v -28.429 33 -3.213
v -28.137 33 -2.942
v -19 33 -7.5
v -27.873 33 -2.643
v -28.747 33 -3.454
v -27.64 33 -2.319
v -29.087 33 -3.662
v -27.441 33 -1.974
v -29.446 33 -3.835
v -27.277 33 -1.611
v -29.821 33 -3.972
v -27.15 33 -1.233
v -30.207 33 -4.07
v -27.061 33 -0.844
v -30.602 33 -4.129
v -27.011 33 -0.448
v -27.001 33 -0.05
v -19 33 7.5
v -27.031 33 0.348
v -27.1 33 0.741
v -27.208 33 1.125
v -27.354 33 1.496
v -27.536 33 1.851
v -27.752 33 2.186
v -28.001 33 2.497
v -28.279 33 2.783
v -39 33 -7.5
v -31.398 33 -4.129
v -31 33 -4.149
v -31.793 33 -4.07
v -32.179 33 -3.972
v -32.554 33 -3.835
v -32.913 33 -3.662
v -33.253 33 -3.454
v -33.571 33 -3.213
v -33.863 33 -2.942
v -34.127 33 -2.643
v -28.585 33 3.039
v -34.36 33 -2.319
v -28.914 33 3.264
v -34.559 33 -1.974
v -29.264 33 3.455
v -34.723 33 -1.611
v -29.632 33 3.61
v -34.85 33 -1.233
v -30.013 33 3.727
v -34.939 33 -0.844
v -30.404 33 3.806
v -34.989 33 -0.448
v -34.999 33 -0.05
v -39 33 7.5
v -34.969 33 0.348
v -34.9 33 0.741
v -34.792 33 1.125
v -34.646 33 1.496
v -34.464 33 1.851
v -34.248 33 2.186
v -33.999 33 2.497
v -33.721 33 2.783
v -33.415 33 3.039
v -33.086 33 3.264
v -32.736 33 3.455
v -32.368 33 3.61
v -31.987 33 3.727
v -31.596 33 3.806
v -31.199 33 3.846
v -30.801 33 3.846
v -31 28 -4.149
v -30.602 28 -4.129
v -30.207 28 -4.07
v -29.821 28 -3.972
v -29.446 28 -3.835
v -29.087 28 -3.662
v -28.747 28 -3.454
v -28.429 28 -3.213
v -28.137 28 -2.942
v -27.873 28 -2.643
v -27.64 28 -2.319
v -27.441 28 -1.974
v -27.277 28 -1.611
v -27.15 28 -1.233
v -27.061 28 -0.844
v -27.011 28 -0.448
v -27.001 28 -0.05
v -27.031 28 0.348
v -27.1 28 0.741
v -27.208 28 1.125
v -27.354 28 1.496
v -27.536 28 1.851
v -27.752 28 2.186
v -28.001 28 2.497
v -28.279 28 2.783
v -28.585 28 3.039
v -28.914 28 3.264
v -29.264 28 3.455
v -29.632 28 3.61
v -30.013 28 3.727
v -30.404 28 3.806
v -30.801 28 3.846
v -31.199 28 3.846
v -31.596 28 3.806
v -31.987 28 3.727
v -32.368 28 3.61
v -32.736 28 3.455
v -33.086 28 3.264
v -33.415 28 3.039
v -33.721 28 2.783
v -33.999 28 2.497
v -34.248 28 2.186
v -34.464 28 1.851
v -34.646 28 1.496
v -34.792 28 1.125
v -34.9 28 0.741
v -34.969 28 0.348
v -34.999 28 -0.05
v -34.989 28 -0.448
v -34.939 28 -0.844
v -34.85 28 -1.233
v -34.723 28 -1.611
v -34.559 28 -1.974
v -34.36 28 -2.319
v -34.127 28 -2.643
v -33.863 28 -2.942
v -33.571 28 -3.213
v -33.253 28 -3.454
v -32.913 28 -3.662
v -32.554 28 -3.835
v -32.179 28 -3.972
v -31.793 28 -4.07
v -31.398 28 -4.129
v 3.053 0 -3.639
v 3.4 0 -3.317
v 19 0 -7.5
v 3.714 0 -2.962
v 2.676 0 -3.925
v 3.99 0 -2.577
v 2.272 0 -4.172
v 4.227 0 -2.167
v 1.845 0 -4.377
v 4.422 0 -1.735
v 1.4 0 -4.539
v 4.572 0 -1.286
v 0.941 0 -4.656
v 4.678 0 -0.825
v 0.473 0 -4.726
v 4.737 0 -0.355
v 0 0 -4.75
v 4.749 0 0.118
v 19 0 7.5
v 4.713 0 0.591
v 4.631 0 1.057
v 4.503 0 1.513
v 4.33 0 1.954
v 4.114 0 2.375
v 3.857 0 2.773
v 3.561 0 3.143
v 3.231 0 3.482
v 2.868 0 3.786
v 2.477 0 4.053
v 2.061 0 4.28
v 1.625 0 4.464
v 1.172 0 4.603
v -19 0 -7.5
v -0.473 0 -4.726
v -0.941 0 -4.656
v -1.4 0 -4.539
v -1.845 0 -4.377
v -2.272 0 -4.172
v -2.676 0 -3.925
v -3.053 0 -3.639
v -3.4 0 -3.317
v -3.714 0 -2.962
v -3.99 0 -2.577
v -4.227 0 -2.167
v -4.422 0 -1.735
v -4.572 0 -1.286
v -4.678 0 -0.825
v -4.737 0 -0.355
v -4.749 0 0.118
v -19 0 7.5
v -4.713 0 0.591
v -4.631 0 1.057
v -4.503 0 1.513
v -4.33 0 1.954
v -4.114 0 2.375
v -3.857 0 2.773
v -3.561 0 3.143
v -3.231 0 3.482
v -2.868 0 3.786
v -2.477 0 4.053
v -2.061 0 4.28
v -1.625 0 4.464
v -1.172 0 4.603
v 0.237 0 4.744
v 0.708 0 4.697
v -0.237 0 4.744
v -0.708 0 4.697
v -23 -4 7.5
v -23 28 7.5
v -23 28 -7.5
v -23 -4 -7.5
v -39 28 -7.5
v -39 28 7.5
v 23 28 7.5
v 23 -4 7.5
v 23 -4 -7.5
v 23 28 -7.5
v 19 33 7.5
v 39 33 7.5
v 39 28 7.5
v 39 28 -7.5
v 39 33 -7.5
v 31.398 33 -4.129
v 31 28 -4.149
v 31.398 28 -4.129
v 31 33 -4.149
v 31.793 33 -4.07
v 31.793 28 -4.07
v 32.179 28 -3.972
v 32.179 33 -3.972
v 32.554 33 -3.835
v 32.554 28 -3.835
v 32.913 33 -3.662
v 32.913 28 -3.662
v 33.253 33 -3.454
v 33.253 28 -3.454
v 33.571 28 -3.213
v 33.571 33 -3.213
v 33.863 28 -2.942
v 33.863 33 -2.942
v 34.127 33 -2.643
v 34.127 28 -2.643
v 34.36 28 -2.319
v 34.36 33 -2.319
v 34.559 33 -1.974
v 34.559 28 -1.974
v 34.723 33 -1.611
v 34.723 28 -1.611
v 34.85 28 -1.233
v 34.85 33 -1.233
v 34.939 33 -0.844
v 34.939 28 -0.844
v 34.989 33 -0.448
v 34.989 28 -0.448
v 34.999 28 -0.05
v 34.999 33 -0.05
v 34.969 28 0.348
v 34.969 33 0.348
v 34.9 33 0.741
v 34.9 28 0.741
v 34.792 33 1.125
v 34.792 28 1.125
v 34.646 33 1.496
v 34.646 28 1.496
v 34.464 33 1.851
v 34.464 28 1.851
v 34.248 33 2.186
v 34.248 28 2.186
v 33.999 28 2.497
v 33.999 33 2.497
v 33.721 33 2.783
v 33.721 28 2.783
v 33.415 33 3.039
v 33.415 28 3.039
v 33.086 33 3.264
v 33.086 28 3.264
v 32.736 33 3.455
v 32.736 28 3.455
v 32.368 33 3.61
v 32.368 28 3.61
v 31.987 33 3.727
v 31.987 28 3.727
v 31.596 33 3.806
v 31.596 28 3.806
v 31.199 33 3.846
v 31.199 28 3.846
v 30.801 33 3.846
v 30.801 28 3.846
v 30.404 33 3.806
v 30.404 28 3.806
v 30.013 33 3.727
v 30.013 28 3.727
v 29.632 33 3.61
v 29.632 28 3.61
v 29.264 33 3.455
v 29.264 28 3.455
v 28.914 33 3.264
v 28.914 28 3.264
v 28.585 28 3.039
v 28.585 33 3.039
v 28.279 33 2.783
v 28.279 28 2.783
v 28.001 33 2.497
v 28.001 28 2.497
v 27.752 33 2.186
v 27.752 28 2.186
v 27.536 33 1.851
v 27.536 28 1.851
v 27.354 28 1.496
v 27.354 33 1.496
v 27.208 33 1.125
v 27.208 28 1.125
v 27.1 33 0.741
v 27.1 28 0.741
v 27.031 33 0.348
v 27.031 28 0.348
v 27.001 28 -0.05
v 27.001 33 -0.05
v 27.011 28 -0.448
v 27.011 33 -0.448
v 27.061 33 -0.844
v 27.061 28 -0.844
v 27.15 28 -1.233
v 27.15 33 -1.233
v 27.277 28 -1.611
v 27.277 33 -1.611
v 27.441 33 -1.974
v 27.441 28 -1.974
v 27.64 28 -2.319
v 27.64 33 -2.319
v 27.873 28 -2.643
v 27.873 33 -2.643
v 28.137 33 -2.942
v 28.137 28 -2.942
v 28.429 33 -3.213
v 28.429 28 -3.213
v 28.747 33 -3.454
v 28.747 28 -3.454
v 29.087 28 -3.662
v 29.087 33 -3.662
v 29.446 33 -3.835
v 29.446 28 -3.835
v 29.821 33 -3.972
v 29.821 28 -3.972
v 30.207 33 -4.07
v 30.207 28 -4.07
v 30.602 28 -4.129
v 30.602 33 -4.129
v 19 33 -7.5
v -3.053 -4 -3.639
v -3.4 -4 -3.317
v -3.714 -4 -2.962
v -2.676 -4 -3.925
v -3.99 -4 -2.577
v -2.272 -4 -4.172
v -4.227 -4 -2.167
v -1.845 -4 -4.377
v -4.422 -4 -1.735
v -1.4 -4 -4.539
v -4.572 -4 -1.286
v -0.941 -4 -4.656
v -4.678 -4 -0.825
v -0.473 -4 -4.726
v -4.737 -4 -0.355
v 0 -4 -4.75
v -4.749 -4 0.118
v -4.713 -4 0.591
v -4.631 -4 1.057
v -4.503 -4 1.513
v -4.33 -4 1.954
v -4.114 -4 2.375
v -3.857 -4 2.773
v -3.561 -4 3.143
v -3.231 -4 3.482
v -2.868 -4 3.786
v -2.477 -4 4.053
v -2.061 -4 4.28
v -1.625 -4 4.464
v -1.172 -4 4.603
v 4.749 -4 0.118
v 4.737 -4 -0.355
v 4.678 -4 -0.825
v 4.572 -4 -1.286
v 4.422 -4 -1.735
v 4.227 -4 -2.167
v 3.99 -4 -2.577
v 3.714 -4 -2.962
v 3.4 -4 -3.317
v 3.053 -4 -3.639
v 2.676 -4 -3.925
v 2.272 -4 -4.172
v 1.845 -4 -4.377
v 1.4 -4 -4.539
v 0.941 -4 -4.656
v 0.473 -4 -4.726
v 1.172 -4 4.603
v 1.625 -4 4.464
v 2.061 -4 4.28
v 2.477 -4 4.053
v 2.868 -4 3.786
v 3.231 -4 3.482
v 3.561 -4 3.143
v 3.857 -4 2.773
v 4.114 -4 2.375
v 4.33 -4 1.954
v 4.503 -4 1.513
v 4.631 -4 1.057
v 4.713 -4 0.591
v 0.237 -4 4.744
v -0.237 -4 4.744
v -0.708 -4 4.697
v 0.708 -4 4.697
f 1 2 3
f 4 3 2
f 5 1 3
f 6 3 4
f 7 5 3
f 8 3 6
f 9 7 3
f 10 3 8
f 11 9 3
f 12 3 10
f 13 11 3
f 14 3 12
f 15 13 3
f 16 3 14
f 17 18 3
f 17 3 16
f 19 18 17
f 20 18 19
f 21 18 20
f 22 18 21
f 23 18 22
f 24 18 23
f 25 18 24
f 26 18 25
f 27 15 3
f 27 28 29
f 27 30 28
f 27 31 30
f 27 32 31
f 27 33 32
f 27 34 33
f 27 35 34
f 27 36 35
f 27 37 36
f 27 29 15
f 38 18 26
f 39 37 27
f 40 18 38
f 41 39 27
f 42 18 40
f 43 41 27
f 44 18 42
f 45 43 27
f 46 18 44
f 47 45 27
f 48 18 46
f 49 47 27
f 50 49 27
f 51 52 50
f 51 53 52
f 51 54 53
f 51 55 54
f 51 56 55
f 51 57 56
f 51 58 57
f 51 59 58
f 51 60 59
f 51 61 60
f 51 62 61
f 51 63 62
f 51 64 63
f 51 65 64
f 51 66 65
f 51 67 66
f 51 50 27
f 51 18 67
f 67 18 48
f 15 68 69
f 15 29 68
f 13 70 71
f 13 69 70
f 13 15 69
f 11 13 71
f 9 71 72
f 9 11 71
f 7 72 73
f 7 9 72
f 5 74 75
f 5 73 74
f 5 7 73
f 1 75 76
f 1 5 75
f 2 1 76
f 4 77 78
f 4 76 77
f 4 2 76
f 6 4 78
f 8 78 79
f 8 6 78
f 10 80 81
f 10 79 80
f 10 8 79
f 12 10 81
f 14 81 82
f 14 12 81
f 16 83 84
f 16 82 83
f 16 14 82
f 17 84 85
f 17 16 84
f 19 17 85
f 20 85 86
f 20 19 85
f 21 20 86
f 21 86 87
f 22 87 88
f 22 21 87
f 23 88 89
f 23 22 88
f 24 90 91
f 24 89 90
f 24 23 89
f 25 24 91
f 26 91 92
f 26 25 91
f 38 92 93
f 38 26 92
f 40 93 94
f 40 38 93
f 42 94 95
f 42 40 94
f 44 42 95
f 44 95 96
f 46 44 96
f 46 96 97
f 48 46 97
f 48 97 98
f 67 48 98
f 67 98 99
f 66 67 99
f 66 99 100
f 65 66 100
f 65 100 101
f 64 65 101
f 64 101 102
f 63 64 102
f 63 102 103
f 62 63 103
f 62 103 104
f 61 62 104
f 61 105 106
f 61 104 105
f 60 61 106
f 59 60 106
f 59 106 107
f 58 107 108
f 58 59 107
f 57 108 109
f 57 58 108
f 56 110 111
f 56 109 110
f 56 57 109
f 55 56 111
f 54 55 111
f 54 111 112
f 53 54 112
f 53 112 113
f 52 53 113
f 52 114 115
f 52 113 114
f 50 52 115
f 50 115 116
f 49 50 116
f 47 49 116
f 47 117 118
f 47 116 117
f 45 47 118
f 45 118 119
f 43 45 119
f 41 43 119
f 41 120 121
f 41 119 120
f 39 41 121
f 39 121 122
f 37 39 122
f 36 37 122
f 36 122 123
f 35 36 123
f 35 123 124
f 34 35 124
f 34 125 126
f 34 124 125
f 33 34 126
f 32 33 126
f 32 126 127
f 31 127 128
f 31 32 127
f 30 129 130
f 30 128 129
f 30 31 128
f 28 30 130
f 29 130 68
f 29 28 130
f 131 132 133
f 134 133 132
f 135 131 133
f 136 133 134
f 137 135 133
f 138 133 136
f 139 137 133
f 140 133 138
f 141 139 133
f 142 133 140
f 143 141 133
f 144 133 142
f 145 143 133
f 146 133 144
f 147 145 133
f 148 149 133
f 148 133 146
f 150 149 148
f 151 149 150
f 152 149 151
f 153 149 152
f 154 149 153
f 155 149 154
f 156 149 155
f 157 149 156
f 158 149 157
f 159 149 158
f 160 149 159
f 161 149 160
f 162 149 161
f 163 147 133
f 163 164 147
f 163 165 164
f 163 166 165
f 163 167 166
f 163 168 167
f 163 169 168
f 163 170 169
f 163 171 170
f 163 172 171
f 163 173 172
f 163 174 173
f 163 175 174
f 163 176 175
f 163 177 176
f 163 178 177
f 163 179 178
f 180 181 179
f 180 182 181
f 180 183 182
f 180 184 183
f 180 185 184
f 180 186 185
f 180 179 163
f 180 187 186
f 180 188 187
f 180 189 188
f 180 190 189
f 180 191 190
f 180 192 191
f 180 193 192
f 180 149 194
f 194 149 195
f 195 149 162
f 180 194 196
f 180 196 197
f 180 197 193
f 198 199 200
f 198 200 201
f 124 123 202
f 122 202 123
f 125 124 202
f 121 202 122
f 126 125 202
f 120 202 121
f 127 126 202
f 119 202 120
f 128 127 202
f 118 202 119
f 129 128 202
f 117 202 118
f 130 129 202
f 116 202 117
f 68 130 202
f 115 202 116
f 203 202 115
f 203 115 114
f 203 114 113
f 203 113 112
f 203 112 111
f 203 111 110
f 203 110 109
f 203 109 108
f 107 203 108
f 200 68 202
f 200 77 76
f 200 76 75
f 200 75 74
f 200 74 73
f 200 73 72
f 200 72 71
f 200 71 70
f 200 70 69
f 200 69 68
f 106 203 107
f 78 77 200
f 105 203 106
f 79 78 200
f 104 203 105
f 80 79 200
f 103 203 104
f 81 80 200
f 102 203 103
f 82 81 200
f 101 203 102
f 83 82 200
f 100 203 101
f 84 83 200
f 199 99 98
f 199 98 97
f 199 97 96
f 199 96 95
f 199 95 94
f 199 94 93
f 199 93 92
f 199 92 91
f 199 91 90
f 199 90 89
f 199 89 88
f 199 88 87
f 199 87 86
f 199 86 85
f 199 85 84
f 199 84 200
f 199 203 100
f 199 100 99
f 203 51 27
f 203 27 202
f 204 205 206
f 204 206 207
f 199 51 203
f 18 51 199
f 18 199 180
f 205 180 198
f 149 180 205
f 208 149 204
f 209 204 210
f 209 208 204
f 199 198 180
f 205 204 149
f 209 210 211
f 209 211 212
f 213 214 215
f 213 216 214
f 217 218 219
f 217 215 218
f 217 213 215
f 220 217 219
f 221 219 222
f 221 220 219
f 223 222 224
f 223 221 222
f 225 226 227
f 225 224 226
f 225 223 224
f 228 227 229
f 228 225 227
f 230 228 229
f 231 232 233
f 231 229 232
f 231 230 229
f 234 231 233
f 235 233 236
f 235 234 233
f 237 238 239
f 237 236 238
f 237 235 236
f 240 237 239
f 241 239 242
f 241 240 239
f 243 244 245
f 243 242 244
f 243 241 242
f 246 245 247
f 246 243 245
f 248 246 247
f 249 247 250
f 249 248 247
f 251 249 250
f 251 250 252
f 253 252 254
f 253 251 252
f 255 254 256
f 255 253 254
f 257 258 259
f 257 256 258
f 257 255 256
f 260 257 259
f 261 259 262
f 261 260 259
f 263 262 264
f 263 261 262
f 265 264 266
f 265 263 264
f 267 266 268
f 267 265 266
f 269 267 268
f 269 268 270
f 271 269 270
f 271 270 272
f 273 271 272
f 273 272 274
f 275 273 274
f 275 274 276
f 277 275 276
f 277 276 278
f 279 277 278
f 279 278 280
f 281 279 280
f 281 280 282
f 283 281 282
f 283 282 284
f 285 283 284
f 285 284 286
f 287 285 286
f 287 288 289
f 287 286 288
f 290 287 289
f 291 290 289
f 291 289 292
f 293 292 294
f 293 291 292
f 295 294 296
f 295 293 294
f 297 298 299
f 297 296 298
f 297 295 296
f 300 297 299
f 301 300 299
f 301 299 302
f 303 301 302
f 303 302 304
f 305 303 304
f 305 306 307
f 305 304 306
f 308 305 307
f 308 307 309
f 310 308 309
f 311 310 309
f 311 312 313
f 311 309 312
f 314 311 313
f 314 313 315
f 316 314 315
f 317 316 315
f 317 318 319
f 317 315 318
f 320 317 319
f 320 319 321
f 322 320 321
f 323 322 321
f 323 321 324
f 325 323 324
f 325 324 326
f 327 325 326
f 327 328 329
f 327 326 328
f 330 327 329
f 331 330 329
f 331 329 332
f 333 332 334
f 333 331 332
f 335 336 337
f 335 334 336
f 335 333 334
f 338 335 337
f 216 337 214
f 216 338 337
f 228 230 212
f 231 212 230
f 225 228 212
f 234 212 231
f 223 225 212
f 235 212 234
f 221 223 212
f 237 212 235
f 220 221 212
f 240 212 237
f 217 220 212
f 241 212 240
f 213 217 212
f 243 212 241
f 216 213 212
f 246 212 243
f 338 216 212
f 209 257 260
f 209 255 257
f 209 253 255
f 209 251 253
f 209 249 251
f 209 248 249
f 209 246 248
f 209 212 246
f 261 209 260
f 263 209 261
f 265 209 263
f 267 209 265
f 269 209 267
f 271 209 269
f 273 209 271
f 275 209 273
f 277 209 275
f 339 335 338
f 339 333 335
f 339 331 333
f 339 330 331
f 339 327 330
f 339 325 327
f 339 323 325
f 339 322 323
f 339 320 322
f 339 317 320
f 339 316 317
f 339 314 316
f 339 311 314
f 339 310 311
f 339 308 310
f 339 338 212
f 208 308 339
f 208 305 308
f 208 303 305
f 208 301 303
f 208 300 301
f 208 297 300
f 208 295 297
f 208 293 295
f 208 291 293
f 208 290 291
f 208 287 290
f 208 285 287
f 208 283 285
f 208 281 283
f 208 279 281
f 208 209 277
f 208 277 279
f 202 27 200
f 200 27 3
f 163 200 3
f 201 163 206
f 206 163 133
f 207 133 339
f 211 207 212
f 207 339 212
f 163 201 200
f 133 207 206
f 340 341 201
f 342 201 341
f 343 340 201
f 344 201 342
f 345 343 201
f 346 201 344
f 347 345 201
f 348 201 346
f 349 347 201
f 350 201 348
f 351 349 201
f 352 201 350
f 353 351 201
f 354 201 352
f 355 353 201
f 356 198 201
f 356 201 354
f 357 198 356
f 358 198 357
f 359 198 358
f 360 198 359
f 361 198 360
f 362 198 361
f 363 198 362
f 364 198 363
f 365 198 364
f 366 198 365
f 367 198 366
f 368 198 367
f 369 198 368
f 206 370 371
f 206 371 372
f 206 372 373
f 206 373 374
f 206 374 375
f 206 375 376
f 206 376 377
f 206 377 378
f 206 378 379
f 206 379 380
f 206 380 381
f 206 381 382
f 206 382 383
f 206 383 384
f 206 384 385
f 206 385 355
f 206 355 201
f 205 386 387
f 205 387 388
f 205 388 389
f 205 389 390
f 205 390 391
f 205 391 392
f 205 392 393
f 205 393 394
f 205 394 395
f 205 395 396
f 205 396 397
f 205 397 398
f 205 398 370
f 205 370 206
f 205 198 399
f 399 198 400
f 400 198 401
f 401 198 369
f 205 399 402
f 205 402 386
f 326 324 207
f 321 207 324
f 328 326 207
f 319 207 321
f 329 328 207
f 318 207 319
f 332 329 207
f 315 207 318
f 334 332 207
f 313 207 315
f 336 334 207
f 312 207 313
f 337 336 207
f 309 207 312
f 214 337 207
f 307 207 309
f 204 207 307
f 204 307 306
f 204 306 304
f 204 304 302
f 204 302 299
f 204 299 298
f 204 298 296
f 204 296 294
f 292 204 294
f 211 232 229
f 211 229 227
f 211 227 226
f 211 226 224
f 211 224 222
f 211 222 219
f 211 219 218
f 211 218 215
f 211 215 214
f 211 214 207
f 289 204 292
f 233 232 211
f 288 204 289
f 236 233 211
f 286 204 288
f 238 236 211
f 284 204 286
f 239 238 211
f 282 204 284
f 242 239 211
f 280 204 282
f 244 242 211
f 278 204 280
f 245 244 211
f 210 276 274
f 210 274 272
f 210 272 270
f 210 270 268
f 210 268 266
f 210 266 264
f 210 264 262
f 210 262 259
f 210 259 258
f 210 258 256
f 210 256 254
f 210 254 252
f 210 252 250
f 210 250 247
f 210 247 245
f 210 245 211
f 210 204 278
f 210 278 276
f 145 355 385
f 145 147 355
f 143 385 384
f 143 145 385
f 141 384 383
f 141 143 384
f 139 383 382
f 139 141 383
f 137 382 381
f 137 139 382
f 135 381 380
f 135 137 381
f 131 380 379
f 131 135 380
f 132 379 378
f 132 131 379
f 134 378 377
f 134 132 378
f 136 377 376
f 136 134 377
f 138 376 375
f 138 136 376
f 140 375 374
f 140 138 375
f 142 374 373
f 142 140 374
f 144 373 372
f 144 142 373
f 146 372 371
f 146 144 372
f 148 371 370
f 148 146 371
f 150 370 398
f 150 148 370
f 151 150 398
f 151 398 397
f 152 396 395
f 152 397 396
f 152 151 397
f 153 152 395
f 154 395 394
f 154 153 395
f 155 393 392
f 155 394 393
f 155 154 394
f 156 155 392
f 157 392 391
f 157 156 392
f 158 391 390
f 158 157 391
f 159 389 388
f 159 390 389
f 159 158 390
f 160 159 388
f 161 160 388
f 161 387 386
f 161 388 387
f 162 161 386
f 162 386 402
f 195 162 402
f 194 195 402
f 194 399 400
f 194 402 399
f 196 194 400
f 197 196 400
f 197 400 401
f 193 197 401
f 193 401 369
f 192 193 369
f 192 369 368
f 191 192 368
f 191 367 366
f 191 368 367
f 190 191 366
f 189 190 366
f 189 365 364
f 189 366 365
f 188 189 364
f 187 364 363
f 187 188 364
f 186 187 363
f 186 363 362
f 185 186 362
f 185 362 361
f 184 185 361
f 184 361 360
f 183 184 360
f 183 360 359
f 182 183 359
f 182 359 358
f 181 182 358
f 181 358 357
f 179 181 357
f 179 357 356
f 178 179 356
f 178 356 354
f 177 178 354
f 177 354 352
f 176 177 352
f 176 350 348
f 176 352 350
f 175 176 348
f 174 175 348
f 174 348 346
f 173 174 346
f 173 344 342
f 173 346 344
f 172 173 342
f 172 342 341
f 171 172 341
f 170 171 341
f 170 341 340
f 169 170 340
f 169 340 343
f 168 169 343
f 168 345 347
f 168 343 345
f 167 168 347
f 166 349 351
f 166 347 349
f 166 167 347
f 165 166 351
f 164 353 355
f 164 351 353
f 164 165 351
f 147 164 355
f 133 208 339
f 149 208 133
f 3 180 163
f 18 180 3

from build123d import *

# Parameters (mm, degrees)
RESSALTO_EXTRUS_O1_DEPTH   = 7.5
CORTE_EXTRUS_O2_DEPTH      = 55.27936993
CORTE_EXTRUS_O2_DEPTH_BACK = 55.27936993
ESBO_O3_R                  = 4.75
CORTE_EXTRUS_O3_DEPTH      = 52.002450921
CORTE_EXTRUS_O3_DEPTH_BACK = 52.002450921
ESBO_O4_R                  = 4


with BuildPart() as part:
    # Esboço1 → Ressalto-extrusão1 (new, symmetric)
    with BuildSketch(Plane.XY):
        Polygon((19, 0), (-19, 0), (-19, 33), (-39, 33), (-39, 28), (-23, 28), (-23, -4), (23, -4), (23, 28), (39, 28), (39, 33), (19, 33), align=None)
    extrude(amount=RESSALTO_EXTRUS_O1_DEPTH, both=True)

    # Esboço3 → Corte-extrusão2 (cut, two sides: drawn at the far end of the back side and taken through both)
    with BuildSketch(Plane(origin=(0, -4, 0), x_dir=(-1, 0, 0), z_dir=(0, -1, 0)).offset(-CORTE_EXTRUS_O2_DEPTH_BACK)):
        with Locations(Location((0, 0, 0), (0, 0, 90))):
            Circle(ESBO_O3_R)
    extrude(amount=CORTE_EXTRUS_O2_DEPTH + CORTE_EXTRUS_O2_DEPTH_BACK, mode=Mode.SUBTRACT)

    # Esboço4 → Corte-extrusão3 (cut, two sides: drawn at the far end of the back side and taken through both)
    with BuildSketch(Plane(origin=(0, 28, 0), x_dir=(-1, 0, 0), z_dir=(0, -1, 0)).offset(-CORTE_EXTRUS_O3_DEPTH_BACK)):
        with Locations(Location((31, 0.149250584, 0), (0, 0, 90))):
            Circle(ESBO_O4_R)
        with Locations(Location((-31, 0.149250584, 0), (0, 0, 90))):
            Circle(ESBO_O4_R)
    extrude(amount=CORTE_EXTRUS_O3_DEPTH + CORTE_EXTRUS_O3_DEPTH_BACK, mode=Mode.SUBTRACT)


solid = part.part
